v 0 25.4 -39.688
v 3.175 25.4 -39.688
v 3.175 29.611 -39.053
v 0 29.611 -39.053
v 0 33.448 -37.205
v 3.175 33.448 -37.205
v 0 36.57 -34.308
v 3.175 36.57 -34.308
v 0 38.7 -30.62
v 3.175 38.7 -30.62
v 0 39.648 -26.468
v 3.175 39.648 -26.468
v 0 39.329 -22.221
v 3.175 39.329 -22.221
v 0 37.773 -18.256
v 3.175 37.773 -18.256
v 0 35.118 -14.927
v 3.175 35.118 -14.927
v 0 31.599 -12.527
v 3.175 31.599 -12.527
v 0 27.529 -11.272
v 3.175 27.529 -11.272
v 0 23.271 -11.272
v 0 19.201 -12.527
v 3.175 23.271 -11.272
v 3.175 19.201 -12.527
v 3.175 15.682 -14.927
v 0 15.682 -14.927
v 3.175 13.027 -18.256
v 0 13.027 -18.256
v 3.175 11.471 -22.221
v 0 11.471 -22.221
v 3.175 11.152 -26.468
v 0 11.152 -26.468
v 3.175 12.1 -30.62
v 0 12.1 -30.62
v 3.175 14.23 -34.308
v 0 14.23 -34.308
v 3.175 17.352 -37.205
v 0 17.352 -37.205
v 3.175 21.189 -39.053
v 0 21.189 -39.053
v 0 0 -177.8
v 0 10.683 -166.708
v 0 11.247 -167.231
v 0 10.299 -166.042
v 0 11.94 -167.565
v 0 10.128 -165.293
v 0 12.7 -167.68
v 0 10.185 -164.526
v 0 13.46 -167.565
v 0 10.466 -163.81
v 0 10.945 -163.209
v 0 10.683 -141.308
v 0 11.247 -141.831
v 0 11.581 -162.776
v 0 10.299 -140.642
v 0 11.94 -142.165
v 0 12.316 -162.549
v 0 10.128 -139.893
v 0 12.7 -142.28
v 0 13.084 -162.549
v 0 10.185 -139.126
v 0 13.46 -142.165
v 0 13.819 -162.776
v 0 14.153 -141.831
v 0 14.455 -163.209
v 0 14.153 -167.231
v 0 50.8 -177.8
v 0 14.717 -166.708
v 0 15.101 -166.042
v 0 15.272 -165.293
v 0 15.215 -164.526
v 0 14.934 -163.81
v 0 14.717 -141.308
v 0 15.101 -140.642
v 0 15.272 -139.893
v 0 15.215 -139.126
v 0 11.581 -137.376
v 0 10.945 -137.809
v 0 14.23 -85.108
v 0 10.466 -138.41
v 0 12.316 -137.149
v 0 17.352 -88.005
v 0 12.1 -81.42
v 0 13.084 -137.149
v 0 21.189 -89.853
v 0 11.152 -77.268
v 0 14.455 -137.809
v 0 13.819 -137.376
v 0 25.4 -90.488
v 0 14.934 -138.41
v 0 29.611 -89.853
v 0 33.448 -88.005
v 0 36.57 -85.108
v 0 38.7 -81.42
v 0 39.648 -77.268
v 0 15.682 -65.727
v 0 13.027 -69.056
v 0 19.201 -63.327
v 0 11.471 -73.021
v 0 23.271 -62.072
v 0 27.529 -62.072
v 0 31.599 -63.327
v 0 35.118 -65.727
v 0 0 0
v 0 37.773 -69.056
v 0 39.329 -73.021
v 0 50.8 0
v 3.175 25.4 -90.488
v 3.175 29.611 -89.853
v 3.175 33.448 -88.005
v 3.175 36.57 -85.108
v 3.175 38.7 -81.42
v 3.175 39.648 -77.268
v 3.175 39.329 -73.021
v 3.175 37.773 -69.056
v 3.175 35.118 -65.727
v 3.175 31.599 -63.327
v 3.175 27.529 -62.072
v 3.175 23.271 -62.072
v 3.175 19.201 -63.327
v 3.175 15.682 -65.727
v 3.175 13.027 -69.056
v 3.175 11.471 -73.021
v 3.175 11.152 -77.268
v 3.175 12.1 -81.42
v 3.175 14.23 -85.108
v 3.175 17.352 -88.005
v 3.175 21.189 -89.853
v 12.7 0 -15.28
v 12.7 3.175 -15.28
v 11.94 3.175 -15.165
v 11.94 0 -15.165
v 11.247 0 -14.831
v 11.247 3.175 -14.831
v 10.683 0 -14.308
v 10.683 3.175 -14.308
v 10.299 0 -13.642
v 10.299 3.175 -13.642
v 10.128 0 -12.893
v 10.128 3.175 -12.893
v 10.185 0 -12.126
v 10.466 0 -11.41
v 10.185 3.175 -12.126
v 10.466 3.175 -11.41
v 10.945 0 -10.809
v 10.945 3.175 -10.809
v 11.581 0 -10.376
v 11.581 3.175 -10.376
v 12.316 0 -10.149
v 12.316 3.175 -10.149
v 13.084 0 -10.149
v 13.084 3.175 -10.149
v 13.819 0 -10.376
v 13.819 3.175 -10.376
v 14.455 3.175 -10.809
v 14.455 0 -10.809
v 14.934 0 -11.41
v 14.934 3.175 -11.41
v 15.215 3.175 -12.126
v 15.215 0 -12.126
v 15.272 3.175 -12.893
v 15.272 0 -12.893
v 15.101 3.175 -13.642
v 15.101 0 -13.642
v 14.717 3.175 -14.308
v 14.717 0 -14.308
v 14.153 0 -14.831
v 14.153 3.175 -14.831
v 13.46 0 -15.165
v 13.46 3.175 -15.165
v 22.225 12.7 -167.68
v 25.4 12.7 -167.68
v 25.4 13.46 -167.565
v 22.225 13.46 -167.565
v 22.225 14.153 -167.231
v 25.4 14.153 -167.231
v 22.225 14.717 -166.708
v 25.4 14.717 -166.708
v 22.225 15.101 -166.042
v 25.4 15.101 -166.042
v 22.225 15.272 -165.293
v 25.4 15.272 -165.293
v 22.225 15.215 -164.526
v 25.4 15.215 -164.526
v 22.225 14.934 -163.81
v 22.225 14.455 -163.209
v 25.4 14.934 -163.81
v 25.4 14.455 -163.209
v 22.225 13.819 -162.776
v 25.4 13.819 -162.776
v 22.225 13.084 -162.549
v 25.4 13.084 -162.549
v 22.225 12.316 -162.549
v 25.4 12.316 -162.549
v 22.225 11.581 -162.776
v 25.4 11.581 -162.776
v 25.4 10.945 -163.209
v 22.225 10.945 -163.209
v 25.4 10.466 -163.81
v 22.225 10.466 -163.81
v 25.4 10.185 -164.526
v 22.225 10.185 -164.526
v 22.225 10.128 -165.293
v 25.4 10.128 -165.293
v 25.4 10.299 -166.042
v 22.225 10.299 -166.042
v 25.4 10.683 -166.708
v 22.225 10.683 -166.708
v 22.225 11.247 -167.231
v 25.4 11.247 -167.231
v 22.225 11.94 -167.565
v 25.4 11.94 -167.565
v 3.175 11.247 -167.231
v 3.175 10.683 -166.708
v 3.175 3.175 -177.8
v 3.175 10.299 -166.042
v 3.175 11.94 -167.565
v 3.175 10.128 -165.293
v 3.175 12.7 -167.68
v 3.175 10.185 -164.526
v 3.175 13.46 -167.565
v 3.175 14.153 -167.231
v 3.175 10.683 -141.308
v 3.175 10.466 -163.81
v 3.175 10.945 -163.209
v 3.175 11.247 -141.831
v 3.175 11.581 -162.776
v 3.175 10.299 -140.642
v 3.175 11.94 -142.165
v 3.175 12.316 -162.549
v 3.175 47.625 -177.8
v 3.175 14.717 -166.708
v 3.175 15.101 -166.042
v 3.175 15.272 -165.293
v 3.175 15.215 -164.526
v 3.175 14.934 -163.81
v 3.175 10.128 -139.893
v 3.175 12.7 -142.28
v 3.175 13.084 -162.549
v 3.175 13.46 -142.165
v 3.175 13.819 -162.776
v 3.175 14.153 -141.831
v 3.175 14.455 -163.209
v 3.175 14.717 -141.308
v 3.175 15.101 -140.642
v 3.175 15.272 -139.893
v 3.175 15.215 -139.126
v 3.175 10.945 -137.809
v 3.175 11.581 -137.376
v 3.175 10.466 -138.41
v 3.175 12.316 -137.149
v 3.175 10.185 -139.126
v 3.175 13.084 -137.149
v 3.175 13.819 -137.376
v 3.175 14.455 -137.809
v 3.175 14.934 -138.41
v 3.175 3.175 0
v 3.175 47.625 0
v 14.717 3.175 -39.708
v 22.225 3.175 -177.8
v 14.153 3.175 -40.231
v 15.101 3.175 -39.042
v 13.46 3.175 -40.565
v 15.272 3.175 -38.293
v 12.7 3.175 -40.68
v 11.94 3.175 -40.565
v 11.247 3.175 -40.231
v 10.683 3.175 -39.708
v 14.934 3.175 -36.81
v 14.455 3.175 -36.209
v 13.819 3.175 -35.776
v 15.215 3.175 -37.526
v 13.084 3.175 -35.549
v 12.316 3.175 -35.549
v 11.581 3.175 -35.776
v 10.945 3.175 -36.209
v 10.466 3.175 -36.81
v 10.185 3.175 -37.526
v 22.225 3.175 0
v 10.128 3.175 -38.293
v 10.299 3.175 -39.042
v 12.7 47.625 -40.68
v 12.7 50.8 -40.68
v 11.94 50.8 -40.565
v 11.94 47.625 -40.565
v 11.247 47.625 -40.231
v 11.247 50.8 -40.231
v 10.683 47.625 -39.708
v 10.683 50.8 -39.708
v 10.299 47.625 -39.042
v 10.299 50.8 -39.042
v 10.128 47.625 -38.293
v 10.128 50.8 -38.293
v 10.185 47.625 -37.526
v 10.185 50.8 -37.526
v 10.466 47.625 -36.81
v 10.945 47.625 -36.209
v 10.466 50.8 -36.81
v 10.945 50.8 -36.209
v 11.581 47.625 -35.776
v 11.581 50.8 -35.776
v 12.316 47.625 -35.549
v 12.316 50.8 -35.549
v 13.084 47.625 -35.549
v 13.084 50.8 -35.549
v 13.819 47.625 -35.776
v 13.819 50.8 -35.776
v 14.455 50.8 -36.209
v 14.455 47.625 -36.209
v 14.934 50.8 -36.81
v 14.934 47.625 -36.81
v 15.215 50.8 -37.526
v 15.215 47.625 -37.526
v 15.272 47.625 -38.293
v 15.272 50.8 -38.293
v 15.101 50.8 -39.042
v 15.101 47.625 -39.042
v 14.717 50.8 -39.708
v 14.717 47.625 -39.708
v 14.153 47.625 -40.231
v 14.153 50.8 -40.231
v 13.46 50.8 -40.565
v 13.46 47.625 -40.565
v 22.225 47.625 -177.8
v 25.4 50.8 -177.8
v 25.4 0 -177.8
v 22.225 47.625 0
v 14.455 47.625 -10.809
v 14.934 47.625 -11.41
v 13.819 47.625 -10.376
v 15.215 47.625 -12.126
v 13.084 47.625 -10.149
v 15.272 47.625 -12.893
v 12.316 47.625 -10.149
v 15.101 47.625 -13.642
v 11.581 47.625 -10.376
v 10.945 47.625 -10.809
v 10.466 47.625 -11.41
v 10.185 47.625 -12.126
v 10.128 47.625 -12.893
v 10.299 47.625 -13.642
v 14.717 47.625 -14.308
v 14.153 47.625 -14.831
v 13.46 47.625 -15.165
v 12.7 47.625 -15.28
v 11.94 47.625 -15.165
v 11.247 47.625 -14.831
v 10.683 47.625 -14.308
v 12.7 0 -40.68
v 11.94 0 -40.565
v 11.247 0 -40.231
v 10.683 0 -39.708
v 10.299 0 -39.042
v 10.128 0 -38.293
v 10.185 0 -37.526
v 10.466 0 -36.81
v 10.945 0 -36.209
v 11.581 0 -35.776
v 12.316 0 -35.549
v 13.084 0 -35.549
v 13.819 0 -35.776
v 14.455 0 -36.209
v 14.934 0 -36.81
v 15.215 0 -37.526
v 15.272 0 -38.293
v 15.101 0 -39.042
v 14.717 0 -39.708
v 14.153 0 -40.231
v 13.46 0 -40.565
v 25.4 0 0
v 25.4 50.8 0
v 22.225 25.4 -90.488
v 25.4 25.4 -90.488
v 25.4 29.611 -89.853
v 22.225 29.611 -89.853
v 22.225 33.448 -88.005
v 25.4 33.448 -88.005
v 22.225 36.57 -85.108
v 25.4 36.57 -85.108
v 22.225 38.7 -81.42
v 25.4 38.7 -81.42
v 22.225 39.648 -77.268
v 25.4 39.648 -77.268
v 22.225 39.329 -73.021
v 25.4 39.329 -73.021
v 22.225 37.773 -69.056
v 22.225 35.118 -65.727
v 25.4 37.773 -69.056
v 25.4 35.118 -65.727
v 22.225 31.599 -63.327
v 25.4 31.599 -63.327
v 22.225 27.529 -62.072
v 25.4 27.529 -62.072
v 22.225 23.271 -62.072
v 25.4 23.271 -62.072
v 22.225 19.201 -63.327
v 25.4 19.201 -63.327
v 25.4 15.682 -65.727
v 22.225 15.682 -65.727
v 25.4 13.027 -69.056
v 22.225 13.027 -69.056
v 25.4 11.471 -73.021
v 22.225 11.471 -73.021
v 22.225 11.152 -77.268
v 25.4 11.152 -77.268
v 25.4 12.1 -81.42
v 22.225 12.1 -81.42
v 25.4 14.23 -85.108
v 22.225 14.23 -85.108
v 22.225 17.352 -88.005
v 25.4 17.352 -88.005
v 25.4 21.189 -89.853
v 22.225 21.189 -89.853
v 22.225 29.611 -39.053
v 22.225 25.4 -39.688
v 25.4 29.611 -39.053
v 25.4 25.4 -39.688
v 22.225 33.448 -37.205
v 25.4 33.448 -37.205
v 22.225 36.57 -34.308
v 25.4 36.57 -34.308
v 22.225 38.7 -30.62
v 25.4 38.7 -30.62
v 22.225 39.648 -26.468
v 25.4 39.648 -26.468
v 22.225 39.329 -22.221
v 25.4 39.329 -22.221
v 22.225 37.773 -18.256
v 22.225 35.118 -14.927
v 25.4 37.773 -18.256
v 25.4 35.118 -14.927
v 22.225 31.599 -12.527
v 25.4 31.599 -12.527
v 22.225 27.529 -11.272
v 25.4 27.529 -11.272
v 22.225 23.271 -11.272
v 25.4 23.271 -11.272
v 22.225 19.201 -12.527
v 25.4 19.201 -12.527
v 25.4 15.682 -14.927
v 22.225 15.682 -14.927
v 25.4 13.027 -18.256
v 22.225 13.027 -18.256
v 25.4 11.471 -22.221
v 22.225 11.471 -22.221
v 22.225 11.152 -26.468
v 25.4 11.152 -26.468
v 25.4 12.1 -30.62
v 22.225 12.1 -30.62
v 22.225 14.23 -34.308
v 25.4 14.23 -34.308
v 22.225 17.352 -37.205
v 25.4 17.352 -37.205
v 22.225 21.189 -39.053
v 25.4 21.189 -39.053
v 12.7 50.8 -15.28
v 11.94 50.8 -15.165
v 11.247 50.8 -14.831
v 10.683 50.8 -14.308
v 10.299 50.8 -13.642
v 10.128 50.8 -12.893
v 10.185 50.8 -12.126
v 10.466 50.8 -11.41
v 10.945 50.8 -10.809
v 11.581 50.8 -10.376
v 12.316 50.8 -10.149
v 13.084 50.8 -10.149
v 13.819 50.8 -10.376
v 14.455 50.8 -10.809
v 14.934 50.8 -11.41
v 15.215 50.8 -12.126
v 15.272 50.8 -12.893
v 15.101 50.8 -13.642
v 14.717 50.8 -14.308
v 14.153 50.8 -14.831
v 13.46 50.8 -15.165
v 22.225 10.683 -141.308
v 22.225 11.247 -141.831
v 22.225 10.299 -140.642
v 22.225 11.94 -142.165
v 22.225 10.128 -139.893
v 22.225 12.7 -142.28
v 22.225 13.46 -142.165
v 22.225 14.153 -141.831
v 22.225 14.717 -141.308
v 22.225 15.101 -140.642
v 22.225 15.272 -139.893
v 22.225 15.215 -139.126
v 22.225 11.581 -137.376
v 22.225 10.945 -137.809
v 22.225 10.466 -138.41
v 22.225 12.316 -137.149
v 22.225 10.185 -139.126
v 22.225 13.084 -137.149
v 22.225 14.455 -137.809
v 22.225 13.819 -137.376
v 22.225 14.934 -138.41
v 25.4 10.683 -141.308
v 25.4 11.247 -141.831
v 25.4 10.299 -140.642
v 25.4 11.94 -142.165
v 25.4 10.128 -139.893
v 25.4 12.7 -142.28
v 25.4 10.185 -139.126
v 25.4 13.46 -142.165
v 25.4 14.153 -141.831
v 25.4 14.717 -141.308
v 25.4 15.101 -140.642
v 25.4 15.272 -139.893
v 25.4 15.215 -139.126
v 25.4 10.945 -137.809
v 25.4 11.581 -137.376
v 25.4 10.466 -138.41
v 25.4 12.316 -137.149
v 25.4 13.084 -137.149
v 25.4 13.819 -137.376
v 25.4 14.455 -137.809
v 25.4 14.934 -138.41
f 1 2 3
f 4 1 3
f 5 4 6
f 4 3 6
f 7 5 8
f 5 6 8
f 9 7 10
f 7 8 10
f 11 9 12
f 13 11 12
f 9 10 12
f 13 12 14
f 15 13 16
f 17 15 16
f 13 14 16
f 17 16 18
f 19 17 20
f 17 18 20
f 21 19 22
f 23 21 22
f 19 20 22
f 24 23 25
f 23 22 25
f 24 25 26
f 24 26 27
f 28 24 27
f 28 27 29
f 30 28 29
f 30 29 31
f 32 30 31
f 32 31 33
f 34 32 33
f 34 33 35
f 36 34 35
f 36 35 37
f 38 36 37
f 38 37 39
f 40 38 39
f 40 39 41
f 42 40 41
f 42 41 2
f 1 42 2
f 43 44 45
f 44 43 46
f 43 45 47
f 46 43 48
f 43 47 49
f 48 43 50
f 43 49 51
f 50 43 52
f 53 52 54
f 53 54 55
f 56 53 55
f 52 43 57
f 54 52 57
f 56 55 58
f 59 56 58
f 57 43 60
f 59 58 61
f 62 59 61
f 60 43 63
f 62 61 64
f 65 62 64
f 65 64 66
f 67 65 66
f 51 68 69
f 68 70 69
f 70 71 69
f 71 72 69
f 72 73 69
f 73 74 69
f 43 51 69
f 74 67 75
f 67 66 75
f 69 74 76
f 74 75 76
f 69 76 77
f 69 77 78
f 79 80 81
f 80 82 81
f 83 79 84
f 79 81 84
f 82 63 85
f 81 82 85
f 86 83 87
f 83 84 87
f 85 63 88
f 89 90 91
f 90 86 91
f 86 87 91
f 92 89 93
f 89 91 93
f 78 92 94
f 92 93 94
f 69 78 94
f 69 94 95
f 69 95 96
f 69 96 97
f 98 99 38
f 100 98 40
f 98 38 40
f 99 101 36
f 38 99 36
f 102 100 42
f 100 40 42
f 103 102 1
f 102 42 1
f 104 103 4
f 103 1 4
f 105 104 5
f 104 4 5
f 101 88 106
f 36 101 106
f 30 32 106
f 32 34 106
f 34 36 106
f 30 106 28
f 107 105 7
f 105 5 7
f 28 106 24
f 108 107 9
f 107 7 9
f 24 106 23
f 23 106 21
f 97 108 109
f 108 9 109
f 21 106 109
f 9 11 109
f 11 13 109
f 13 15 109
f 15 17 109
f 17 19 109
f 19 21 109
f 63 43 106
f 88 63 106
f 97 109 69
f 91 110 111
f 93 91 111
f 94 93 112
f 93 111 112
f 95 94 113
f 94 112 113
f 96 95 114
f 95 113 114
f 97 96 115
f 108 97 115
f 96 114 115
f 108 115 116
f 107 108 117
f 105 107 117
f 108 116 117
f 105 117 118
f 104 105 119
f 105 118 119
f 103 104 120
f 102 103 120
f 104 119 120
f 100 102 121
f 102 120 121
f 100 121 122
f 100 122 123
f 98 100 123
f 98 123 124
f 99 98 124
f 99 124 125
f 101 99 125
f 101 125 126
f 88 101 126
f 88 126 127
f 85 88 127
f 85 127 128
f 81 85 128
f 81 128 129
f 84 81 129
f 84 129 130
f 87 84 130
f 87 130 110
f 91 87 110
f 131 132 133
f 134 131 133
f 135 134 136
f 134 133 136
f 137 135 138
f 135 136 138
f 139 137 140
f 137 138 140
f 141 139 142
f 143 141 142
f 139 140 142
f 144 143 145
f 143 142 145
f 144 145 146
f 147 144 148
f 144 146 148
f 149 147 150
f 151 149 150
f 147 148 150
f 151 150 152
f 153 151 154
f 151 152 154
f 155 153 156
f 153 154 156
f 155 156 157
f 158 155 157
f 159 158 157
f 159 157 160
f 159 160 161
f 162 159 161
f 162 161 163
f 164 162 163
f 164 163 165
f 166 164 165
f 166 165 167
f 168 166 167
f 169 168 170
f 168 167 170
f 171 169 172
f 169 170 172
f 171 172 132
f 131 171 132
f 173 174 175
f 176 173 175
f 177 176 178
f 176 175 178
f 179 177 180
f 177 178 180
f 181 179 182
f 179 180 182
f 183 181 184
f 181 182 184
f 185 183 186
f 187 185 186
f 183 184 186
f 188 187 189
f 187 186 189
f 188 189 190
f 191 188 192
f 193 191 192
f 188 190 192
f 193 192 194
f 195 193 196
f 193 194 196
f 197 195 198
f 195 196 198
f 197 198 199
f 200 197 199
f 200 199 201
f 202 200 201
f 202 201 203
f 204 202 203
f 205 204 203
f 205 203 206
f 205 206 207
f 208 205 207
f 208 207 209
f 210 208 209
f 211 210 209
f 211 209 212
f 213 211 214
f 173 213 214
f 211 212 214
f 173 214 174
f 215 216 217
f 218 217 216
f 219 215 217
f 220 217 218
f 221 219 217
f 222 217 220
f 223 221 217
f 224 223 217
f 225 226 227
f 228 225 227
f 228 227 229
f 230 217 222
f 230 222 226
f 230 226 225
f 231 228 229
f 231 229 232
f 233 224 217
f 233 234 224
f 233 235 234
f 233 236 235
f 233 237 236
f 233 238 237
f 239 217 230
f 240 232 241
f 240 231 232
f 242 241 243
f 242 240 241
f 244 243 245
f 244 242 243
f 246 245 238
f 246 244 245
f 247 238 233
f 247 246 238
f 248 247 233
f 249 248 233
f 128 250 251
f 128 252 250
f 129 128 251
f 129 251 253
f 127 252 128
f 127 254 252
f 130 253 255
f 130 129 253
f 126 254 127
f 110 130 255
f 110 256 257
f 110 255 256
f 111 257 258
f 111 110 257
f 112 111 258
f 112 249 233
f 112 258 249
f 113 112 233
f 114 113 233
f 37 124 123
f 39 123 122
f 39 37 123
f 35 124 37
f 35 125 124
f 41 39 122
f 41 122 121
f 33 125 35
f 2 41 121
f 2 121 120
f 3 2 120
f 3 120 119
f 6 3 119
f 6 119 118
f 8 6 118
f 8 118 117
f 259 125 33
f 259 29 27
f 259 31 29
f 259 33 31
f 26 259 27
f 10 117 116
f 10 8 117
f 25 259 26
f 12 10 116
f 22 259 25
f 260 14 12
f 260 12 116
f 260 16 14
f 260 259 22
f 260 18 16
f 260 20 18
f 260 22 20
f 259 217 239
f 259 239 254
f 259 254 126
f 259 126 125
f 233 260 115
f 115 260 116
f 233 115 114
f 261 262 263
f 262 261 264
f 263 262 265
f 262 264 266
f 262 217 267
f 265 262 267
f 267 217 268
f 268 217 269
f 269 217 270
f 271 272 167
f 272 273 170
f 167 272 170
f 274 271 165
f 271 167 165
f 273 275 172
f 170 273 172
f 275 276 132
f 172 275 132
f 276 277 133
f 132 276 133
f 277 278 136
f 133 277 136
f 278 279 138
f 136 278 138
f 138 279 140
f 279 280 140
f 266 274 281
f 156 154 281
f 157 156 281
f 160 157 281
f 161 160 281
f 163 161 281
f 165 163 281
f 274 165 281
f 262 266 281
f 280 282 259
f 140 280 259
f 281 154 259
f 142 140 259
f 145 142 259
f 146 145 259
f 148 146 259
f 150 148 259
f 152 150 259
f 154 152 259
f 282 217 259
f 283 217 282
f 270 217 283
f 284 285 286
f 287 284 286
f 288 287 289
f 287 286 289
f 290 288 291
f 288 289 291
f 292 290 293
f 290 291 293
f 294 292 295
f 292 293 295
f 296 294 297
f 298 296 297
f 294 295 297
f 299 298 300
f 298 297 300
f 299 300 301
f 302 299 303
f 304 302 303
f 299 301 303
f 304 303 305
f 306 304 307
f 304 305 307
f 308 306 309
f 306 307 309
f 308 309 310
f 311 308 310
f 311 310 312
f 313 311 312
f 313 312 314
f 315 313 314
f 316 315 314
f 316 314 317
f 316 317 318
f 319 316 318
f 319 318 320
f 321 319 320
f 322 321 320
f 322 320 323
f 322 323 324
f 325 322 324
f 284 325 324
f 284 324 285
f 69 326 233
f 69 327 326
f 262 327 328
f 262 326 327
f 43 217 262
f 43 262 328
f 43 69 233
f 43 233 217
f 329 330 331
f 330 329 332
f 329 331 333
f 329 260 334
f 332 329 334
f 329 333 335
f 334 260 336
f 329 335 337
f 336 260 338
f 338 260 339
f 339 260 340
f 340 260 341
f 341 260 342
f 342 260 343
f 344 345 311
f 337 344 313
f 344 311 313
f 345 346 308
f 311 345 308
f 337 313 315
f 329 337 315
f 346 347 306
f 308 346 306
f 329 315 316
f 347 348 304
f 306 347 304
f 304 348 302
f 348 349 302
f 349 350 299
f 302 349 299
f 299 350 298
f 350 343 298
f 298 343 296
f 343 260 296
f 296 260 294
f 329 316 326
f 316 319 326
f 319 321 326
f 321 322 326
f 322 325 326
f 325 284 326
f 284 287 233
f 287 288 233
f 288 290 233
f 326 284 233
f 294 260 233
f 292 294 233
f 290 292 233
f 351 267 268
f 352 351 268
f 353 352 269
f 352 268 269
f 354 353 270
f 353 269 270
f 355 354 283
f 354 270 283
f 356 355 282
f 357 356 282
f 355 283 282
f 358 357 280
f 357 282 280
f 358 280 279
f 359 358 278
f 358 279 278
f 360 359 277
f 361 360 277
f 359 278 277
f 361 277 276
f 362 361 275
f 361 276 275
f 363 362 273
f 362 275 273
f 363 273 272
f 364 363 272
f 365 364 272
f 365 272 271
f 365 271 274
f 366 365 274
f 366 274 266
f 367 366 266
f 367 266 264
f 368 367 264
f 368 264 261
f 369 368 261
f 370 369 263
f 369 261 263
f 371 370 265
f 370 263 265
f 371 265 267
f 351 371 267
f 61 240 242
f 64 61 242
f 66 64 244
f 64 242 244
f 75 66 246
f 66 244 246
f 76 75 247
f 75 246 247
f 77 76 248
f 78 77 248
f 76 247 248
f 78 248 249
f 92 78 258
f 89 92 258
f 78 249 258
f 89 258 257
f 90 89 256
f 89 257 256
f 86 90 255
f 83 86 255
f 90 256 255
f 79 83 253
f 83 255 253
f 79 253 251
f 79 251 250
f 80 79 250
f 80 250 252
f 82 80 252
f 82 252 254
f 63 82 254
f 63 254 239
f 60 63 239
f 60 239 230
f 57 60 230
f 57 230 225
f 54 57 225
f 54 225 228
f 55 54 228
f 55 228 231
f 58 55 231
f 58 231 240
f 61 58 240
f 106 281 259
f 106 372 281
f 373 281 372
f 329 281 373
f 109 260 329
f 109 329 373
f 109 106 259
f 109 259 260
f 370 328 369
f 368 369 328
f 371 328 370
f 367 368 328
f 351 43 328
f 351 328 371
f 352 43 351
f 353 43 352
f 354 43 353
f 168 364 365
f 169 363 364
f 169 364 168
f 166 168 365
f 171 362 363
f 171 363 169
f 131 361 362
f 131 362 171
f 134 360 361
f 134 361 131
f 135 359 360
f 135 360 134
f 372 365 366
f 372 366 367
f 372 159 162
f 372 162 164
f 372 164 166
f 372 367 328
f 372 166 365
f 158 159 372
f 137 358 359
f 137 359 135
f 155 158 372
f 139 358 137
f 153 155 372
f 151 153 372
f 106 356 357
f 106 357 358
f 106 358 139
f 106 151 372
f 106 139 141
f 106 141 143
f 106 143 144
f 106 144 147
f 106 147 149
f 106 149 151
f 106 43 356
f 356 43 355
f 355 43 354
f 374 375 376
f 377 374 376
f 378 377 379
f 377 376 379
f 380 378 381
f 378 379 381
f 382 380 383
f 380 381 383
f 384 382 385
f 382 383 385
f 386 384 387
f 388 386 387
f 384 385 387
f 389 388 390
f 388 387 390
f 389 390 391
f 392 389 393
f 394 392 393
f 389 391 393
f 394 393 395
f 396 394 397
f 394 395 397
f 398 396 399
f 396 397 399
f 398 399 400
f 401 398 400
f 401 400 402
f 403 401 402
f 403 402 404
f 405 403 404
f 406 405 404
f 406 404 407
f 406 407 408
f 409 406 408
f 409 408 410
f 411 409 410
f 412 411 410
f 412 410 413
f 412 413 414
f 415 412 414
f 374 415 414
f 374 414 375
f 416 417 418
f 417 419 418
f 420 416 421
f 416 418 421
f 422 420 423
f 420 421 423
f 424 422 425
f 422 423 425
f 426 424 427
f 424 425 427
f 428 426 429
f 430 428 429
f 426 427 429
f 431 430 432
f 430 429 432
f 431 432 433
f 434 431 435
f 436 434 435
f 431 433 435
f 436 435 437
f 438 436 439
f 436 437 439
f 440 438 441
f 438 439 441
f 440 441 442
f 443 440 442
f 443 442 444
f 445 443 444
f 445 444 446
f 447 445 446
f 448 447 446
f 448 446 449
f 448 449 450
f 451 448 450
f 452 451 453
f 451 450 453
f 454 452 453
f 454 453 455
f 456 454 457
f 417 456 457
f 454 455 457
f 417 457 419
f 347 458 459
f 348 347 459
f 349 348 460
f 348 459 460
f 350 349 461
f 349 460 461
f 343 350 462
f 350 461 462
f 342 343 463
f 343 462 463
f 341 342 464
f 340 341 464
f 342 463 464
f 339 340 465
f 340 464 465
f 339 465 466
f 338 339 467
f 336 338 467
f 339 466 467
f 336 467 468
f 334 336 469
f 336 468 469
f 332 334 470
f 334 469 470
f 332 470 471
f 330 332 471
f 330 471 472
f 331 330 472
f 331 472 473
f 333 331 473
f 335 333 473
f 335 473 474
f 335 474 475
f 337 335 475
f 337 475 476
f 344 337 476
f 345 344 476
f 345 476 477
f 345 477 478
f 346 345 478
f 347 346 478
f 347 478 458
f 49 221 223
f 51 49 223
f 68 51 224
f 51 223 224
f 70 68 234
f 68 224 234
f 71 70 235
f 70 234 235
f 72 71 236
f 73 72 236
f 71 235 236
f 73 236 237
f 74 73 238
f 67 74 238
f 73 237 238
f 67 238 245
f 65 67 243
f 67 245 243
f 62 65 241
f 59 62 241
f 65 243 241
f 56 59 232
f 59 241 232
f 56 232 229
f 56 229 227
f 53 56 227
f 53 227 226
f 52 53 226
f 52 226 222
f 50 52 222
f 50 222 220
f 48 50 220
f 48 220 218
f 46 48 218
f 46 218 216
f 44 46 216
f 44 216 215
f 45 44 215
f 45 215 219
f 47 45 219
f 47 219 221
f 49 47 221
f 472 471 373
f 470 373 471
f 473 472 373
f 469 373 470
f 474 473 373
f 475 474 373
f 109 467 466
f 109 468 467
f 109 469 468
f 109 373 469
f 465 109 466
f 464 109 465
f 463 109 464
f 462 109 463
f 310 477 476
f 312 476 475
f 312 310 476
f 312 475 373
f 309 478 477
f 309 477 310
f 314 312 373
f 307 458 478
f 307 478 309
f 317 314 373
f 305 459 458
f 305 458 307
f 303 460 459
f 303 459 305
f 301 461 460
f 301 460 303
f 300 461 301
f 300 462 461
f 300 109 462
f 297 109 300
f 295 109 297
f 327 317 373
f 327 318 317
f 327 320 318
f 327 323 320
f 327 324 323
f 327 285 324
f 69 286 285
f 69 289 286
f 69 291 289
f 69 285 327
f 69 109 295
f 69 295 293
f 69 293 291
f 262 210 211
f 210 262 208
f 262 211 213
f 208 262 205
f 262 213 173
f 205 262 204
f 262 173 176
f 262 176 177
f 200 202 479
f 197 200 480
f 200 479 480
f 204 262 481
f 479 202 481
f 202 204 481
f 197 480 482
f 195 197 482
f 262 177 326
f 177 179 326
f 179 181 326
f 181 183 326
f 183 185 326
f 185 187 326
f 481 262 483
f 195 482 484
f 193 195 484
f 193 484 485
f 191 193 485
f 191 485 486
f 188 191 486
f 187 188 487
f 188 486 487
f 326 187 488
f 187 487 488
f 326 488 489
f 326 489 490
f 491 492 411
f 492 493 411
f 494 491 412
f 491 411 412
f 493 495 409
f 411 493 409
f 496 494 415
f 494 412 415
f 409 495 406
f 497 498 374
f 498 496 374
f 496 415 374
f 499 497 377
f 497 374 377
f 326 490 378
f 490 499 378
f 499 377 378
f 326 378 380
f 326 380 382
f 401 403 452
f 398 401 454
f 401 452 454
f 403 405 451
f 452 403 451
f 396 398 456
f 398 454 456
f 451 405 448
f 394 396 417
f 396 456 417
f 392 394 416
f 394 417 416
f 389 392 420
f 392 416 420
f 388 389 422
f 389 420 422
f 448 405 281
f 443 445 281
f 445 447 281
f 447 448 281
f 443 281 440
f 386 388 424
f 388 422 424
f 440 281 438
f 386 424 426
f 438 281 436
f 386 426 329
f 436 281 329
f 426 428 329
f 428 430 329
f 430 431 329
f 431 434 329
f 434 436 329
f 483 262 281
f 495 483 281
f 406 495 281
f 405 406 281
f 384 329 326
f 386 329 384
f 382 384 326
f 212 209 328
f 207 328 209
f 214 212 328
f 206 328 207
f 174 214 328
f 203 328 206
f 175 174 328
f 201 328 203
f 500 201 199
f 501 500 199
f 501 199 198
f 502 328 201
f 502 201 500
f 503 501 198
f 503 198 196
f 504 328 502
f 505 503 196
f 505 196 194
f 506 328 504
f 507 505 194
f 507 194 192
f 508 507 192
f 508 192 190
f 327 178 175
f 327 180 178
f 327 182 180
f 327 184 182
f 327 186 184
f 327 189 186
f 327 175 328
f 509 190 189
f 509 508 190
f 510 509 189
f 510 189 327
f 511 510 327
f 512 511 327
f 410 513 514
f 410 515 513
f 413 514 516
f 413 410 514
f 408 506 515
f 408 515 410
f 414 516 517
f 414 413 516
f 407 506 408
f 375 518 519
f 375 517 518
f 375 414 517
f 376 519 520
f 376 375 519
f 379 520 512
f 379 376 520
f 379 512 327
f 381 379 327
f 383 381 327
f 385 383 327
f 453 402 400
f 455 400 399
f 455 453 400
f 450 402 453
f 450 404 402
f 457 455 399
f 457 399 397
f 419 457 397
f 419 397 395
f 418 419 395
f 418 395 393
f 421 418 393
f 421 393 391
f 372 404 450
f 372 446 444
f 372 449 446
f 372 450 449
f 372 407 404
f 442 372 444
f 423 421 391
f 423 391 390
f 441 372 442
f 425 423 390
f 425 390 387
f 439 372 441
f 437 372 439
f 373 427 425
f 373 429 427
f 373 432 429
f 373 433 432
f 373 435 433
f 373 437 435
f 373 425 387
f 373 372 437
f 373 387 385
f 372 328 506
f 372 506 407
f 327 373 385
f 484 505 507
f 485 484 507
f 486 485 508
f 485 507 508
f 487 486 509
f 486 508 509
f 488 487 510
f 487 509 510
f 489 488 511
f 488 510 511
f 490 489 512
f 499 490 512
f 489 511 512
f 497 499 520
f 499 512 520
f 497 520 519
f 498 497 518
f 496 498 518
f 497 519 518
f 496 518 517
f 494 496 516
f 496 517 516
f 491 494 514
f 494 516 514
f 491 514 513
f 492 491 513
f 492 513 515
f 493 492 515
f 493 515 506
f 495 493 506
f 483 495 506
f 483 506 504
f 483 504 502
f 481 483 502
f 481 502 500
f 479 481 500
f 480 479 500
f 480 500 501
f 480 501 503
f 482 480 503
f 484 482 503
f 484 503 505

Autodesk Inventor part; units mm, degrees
ref_plane "YZ Plane" through (0, 0, 0) normal (1, 0, 0) x (0, 1, 0)
ref_plane "XZ Plane" through (0, 0, 0) normal (0, 1, 0) x (-1, 0, 0)
ref_plane "XY Plane" through (0, 0, 0) normal (0, 0, 1) x (1, 0, 0)
sketch "Sketch1" plane through (0, 0, 0) normal (1, 0, 0) x (0, 1, 0)
  line L0 (0, 0) -> (50.8, 0)
  line L1 (50.8, 0) -> (50.8, -177.8)
  line L2 (50.8, -177.8) -> (0, -177.8)
  line L3 (0, -177.8) -> (0, 0)
  dimension "d0" = 50.8
  dimension "d1" = 177.8
extrude "Extrusion1" add sketch "Sketch1" along normal blind 25.4
shell "Shell1" thickness 3.175 removed faces 2 at (8.4667, 16.9333, 0) at (8.4667, 33.8667, -177.8)
sketch "Sketch2" plane through (25.4, 0, 0) normal (1, 0, 0) x (0, 0, -1)
  line L0 (0, 3.175) -> (0, 47.625) construction
  line L1 (0, 25.4) -> (177.8, 25.4) construction
  line L2 (177.8, 3.175) -> (177.8, 47.625) construction
  line L3 (0, 25.4) -> (25.4, 25.4) construction
  circle A0 centre (25.4, 25.4) radius 14.2875
  line L4 (25.4, 25.4) -> (76.2, 25.4) construction
  circle A1 centre (76.2, 25.4) radius 14.2875
  circle A2 centre (25.4, 25.4) radius 19.05 construction
  circle A3 centre (76.2, 25.4) radius 19.05 construction
  line L5 (177.8, 50.8) -> (0, 50.8) construction
  line L6 (0, 50.8) -> (12.7, 50.8) construction
  line L7 (12.7, 50.8) -> (12.7, 38.1) construction
  line L8 (12.7, 38.1) -> (0, 38.1) construction
  line L9 (0, 38.1) -> (0, 50.8) construction
  line L10 (0, 0) -> (12.7, 0) construction
  line L11 (12.7, 0) -> (12.7, 12.7) construction
  line L12 (12.7, 12.7) -> (0, 12.7) construction
  line L13 (0, 12.7) -> (0, 0) construction
  line L14 (177.8, 50.8) -> (165.1, 50.8) construction
  line L15 (165.1, 50.8) -> (165.1, 38.1) construction
  line L16 (165.1, 38.1) -> (177.8, 38.1) construction
  line L17 (177.8, 38.1) -> (177.8, 50.8) construction
  line L18 (177.8, 0) -> (165.1, 0) construction
  line L19 (165.1, 0) -> (165.1, 12.7) construction
  line L20 (165.1, 12.7) -> (177.8, 12.7) construction
  line L21 (177.8, 12.7) -> (177.8, 0) construction
  line L22 (177.8, 50.8) -> (139.7, 50.8) construction
  line L23 (139.7, 50.8) -> (139.7, 38.1) construction
  line L24 (139.7, 38.1) -> (177.8, 38.1) construction
  line L25 (177.8, 38.1) -> (177.8, 50.8) construction
  line L26 (177.8, 0) -> (139.7, 0) construction
  line L27 (139.7, 0) -> (139.7, 12.7) construction
  line L28 (139.7, 12.7) -> (177.8, 12.7) construction
  line L29 (177.8, 12.7) -> (177.8, 0) construction
  circle A4 centre (165.1, 12.7) radius 2.5797
  circle A5 centre (139.7, 12.7) radius 2.5797
  dimension "d5" = 25.4
  dimension "d6" = 28.575
  dimension "d7" = 50.8
  dimension "d8" = 28.575
  dimension "d9" = 38.1
  dimension "d10" = 38.1
  dimension "d11" = 12.7
  dimension "d12" = 12.7
  dimension "d13" = 12.7
  dimension "d14" = 12.7
  dimension "d15" = 12.7
  dimension "d16" = 12.7
  dimension "d17" = 12.7
  dimension "d18" = 12.7
  dimension "d19" = 38.1
  dimension "d20" = 38.1
  dimension "d22" = 5.1594
  dimension "d23" = 5.1594
extrude "Extrusion2" cut sketch "Sketch2" against normal blind 50.8
hole "Hole1" at (12.7, 0, -12.7) direction (0, 1, 0) diameter 5.1594 end through all
hole "Hole2" at (12.7, 0, -38.1) direction (0, 1, 0) diameter 5.1594 end through all
properties part number "Top Roller Wheel Mount"
